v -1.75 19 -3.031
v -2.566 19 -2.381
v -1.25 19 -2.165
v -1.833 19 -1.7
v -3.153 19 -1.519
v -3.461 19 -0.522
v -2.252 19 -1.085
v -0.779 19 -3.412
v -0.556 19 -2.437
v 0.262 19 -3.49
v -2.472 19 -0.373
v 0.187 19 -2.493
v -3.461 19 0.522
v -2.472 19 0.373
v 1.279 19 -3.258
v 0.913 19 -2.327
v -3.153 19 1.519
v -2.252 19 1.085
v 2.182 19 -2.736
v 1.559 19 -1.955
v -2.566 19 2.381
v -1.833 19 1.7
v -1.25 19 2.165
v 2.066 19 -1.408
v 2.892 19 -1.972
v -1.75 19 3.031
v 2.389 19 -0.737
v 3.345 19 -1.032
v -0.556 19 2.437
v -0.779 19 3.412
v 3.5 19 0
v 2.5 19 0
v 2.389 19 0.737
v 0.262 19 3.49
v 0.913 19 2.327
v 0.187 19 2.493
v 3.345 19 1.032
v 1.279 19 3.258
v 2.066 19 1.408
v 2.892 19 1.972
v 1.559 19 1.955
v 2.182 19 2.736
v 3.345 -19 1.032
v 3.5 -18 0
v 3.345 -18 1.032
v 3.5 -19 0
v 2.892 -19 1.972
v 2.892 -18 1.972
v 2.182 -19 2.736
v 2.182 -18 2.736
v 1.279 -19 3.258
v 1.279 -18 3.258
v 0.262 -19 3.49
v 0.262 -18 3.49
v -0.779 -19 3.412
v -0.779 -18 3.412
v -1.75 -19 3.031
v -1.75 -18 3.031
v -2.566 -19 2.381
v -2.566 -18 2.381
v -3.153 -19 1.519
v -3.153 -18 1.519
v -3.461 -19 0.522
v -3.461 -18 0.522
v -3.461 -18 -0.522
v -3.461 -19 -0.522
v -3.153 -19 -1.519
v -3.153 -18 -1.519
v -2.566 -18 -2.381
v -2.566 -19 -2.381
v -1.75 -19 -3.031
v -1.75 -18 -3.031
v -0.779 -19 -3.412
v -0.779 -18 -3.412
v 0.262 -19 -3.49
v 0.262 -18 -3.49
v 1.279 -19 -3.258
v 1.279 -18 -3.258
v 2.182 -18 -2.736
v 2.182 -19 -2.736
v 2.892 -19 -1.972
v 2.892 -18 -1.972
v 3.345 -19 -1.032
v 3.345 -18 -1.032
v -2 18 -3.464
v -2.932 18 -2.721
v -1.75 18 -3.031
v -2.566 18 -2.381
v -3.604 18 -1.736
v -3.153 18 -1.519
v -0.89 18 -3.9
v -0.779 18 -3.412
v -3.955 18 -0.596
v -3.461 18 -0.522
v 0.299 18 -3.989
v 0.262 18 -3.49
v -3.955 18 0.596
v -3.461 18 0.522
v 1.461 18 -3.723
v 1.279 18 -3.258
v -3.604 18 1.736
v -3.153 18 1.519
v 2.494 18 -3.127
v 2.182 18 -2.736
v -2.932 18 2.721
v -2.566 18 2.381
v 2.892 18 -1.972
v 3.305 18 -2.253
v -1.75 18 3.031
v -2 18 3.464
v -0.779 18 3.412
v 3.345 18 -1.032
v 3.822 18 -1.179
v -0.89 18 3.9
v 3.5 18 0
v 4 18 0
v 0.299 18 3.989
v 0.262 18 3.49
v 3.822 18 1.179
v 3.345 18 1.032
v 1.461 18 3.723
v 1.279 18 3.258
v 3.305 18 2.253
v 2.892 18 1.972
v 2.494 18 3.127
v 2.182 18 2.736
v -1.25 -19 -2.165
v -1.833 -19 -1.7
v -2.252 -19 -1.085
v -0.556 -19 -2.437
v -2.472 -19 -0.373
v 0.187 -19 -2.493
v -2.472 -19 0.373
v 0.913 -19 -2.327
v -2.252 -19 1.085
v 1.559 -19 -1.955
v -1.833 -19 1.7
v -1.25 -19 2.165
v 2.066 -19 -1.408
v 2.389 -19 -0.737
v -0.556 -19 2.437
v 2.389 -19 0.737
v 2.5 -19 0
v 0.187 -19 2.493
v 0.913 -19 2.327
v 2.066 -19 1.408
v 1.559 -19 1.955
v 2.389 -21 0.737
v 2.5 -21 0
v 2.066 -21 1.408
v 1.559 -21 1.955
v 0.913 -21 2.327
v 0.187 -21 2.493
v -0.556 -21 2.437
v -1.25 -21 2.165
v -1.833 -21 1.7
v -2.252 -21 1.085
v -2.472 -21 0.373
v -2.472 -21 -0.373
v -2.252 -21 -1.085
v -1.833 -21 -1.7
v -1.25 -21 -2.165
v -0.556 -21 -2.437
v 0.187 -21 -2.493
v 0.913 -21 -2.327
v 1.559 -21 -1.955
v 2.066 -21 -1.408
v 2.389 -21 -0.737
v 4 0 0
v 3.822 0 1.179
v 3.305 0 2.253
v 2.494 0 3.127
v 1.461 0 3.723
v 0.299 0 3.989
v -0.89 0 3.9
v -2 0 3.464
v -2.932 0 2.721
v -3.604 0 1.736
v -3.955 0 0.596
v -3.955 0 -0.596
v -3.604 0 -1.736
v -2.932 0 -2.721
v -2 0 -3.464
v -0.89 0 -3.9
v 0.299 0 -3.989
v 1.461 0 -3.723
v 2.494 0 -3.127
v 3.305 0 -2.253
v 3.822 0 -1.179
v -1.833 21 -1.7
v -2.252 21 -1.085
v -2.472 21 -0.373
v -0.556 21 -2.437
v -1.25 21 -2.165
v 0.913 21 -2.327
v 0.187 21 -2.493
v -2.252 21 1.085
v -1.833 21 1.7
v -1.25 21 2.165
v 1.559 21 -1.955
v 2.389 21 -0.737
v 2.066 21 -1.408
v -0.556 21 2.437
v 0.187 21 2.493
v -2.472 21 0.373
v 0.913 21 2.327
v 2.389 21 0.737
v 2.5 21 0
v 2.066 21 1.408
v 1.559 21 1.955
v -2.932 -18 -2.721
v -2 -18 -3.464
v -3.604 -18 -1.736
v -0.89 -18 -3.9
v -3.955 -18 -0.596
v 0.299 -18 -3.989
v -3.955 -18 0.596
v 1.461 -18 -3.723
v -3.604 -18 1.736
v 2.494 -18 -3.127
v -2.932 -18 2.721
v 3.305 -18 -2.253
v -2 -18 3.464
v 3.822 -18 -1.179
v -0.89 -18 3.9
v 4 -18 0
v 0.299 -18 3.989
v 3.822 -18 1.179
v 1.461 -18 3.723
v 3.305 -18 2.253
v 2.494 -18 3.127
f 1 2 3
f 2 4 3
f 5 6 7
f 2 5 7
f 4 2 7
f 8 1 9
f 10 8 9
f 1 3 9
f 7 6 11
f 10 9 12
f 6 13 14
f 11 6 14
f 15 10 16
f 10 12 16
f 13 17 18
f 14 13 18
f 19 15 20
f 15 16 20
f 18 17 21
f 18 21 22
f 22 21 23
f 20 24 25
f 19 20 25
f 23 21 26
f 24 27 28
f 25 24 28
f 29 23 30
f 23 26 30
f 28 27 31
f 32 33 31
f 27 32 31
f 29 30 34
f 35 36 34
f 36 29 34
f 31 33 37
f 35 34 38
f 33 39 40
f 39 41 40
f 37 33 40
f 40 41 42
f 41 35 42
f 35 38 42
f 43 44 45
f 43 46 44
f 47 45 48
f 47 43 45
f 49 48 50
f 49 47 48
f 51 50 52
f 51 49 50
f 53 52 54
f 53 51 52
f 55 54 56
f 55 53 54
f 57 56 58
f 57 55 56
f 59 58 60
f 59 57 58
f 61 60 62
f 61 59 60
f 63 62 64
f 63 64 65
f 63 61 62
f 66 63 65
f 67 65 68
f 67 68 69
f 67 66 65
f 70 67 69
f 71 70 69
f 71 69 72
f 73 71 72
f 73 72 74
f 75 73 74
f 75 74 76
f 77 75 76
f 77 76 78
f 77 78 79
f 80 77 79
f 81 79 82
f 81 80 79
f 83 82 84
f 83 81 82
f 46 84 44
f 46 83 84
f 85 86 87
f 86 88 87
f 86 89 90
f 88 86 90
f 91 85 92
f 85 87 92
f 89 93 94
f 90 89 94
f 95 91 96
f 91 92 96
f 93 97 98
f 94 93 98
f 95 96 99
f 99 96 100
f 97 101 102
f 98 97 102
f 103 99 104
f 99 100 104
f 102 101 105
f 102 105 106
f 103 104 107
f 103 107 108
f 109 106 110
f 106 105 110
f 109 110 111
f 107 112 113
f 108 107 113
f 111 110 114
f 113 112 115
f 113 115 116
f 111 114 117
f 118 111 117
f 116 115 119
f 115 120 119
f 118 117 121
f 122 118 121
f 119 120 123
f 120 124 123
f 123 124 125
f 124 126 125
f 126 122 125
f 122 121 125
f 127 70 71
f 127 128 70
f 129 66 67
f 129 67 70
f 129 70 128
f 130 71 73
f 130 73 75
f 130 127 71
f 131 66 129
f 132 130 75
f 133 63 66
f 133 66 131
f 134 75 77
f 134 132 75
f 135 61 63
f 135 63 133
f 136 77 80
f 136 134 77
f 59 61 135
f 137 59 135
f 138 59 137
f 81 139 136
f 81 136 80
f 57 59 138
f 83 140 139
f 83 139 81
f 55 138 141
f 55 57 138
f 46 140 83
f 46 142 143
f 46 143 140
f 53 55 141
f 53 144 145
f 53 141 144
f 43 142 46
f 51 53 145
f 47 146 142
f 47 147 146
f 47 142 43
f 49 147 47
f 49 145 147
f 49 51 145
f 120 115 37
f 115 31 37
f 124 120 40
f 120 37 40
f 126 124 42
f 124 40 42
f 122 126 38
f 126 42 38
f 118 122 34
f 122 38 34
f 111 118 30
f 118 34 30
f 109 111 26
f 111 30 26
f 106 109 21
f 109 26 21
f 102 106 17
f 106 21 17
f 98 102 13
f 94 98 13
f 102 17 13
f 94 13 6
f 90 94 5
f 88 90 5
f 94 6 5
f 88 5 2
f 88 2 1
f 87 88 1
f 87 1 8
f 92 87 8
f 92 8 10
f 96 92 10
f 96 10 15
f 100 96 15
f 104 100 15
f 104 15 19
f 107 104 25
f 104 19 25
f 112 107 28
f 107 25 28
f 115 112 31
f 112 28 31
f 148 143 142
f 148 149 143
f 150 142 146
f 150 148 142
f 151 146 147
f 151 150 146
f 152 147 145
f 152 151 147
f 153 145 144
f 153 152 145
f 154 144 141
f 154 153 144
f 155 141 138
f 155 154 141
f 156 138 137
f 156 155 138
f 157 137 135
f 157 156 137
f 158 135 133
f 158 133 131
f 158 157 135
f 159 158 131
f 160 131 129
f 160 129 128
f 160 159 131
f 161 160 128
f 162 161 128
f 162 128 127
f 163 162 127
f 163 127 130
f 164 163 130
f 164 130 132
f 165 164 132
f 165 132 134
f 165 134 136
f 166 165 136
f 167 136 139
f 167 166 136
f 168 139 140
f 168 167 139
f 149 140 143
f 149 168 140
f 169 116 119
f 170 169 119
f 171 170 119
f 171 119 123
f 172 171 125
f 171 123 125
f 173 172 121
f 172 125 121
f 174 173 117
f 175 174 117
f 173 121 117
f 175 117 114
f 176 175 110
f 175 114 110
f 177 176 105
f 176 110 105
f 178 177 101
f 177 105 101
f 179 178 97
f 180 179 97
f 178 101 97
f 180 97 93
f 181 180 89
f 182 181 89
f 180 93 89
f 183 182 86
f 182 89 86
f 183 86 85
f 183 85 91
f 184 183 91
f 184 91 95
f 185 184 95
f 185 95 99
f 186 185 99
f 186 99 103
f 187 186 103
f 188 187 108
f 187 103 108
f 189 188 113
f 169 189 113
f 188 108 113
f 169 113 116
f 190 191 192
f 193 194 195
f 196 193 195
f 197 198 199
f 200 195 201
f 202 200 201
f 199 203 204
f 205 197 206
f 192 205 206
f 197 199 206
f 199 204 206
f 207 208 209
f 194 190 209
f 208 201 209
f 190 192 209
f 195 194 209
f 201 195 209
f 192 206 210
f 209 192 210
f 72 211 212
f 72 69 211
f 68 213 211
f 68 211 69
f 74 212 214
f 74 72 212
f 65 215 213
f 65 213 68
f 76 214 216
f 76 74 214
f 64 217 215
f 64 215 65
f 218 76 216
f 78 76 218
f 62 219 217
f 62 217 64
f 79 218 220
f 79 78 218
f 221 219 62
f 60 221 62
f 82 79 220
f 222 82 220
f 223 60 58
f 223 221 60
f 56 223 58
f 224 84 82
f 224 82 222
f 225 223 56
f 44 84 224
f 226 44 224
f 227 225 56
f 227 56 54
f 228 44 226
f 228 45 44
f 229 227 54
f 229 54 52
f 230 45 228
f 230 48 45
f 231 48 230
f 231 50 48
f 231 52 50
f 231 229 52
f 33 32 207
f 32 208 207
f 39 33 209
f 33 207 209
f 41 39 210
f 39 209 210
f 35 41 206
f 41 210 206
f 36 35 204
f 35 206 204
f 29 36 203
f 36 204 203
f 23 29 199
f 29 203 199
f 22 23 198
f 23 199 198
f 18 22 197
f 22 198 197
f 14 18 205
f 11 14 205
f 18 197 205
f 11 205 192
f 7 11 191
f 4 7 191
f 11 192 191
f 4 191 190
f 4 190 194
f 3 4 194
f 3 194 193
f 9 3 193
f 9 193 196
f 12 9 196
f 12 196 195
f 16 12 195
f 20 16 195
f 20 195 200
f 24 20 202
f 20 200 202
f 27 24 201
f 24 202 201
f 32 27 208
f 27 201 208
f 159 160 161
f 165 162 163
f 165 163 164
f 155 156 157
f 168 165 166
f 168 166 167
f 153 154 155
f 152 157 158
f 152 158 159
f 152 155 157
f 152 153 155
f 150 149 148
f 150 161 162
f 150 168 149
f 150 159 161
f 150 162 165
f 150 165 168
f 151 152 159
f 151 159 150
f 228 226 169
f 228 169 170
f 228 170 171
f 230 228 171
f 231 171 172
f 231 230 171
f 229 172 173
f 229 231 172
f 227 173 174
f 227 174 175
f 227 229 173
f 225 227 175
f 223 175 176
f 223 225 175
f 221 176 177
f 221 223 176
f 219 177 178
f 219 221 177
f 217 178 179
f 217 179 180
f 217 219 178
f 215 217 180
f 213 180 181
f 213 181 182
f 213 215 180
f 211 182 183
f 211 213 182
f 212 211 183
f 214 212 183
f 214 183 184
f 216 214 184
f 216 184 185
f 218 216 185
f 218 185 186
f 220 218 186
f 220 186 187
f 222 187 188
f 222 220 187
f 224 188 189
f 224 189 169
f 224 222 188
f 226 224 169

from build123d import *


with BuildPart() as part:
    # Sketch1 → Revolve1 (revolve)
    with BuildSketch(Plane.XY):
        Polygon((0, 21), (0, 0), (4, 0), (4, 18), (3.5, 18), (3.5, 19), (2.5, 19), (2.5, 21), align=None)
    revolve1 = revolve(axis=Axis((0, 21, 0), (0, -1, 0)))

    # Mirror1: Revolve1 across plane
    add(revolve1.mirror(Plane.ZX))


solid = part.part
